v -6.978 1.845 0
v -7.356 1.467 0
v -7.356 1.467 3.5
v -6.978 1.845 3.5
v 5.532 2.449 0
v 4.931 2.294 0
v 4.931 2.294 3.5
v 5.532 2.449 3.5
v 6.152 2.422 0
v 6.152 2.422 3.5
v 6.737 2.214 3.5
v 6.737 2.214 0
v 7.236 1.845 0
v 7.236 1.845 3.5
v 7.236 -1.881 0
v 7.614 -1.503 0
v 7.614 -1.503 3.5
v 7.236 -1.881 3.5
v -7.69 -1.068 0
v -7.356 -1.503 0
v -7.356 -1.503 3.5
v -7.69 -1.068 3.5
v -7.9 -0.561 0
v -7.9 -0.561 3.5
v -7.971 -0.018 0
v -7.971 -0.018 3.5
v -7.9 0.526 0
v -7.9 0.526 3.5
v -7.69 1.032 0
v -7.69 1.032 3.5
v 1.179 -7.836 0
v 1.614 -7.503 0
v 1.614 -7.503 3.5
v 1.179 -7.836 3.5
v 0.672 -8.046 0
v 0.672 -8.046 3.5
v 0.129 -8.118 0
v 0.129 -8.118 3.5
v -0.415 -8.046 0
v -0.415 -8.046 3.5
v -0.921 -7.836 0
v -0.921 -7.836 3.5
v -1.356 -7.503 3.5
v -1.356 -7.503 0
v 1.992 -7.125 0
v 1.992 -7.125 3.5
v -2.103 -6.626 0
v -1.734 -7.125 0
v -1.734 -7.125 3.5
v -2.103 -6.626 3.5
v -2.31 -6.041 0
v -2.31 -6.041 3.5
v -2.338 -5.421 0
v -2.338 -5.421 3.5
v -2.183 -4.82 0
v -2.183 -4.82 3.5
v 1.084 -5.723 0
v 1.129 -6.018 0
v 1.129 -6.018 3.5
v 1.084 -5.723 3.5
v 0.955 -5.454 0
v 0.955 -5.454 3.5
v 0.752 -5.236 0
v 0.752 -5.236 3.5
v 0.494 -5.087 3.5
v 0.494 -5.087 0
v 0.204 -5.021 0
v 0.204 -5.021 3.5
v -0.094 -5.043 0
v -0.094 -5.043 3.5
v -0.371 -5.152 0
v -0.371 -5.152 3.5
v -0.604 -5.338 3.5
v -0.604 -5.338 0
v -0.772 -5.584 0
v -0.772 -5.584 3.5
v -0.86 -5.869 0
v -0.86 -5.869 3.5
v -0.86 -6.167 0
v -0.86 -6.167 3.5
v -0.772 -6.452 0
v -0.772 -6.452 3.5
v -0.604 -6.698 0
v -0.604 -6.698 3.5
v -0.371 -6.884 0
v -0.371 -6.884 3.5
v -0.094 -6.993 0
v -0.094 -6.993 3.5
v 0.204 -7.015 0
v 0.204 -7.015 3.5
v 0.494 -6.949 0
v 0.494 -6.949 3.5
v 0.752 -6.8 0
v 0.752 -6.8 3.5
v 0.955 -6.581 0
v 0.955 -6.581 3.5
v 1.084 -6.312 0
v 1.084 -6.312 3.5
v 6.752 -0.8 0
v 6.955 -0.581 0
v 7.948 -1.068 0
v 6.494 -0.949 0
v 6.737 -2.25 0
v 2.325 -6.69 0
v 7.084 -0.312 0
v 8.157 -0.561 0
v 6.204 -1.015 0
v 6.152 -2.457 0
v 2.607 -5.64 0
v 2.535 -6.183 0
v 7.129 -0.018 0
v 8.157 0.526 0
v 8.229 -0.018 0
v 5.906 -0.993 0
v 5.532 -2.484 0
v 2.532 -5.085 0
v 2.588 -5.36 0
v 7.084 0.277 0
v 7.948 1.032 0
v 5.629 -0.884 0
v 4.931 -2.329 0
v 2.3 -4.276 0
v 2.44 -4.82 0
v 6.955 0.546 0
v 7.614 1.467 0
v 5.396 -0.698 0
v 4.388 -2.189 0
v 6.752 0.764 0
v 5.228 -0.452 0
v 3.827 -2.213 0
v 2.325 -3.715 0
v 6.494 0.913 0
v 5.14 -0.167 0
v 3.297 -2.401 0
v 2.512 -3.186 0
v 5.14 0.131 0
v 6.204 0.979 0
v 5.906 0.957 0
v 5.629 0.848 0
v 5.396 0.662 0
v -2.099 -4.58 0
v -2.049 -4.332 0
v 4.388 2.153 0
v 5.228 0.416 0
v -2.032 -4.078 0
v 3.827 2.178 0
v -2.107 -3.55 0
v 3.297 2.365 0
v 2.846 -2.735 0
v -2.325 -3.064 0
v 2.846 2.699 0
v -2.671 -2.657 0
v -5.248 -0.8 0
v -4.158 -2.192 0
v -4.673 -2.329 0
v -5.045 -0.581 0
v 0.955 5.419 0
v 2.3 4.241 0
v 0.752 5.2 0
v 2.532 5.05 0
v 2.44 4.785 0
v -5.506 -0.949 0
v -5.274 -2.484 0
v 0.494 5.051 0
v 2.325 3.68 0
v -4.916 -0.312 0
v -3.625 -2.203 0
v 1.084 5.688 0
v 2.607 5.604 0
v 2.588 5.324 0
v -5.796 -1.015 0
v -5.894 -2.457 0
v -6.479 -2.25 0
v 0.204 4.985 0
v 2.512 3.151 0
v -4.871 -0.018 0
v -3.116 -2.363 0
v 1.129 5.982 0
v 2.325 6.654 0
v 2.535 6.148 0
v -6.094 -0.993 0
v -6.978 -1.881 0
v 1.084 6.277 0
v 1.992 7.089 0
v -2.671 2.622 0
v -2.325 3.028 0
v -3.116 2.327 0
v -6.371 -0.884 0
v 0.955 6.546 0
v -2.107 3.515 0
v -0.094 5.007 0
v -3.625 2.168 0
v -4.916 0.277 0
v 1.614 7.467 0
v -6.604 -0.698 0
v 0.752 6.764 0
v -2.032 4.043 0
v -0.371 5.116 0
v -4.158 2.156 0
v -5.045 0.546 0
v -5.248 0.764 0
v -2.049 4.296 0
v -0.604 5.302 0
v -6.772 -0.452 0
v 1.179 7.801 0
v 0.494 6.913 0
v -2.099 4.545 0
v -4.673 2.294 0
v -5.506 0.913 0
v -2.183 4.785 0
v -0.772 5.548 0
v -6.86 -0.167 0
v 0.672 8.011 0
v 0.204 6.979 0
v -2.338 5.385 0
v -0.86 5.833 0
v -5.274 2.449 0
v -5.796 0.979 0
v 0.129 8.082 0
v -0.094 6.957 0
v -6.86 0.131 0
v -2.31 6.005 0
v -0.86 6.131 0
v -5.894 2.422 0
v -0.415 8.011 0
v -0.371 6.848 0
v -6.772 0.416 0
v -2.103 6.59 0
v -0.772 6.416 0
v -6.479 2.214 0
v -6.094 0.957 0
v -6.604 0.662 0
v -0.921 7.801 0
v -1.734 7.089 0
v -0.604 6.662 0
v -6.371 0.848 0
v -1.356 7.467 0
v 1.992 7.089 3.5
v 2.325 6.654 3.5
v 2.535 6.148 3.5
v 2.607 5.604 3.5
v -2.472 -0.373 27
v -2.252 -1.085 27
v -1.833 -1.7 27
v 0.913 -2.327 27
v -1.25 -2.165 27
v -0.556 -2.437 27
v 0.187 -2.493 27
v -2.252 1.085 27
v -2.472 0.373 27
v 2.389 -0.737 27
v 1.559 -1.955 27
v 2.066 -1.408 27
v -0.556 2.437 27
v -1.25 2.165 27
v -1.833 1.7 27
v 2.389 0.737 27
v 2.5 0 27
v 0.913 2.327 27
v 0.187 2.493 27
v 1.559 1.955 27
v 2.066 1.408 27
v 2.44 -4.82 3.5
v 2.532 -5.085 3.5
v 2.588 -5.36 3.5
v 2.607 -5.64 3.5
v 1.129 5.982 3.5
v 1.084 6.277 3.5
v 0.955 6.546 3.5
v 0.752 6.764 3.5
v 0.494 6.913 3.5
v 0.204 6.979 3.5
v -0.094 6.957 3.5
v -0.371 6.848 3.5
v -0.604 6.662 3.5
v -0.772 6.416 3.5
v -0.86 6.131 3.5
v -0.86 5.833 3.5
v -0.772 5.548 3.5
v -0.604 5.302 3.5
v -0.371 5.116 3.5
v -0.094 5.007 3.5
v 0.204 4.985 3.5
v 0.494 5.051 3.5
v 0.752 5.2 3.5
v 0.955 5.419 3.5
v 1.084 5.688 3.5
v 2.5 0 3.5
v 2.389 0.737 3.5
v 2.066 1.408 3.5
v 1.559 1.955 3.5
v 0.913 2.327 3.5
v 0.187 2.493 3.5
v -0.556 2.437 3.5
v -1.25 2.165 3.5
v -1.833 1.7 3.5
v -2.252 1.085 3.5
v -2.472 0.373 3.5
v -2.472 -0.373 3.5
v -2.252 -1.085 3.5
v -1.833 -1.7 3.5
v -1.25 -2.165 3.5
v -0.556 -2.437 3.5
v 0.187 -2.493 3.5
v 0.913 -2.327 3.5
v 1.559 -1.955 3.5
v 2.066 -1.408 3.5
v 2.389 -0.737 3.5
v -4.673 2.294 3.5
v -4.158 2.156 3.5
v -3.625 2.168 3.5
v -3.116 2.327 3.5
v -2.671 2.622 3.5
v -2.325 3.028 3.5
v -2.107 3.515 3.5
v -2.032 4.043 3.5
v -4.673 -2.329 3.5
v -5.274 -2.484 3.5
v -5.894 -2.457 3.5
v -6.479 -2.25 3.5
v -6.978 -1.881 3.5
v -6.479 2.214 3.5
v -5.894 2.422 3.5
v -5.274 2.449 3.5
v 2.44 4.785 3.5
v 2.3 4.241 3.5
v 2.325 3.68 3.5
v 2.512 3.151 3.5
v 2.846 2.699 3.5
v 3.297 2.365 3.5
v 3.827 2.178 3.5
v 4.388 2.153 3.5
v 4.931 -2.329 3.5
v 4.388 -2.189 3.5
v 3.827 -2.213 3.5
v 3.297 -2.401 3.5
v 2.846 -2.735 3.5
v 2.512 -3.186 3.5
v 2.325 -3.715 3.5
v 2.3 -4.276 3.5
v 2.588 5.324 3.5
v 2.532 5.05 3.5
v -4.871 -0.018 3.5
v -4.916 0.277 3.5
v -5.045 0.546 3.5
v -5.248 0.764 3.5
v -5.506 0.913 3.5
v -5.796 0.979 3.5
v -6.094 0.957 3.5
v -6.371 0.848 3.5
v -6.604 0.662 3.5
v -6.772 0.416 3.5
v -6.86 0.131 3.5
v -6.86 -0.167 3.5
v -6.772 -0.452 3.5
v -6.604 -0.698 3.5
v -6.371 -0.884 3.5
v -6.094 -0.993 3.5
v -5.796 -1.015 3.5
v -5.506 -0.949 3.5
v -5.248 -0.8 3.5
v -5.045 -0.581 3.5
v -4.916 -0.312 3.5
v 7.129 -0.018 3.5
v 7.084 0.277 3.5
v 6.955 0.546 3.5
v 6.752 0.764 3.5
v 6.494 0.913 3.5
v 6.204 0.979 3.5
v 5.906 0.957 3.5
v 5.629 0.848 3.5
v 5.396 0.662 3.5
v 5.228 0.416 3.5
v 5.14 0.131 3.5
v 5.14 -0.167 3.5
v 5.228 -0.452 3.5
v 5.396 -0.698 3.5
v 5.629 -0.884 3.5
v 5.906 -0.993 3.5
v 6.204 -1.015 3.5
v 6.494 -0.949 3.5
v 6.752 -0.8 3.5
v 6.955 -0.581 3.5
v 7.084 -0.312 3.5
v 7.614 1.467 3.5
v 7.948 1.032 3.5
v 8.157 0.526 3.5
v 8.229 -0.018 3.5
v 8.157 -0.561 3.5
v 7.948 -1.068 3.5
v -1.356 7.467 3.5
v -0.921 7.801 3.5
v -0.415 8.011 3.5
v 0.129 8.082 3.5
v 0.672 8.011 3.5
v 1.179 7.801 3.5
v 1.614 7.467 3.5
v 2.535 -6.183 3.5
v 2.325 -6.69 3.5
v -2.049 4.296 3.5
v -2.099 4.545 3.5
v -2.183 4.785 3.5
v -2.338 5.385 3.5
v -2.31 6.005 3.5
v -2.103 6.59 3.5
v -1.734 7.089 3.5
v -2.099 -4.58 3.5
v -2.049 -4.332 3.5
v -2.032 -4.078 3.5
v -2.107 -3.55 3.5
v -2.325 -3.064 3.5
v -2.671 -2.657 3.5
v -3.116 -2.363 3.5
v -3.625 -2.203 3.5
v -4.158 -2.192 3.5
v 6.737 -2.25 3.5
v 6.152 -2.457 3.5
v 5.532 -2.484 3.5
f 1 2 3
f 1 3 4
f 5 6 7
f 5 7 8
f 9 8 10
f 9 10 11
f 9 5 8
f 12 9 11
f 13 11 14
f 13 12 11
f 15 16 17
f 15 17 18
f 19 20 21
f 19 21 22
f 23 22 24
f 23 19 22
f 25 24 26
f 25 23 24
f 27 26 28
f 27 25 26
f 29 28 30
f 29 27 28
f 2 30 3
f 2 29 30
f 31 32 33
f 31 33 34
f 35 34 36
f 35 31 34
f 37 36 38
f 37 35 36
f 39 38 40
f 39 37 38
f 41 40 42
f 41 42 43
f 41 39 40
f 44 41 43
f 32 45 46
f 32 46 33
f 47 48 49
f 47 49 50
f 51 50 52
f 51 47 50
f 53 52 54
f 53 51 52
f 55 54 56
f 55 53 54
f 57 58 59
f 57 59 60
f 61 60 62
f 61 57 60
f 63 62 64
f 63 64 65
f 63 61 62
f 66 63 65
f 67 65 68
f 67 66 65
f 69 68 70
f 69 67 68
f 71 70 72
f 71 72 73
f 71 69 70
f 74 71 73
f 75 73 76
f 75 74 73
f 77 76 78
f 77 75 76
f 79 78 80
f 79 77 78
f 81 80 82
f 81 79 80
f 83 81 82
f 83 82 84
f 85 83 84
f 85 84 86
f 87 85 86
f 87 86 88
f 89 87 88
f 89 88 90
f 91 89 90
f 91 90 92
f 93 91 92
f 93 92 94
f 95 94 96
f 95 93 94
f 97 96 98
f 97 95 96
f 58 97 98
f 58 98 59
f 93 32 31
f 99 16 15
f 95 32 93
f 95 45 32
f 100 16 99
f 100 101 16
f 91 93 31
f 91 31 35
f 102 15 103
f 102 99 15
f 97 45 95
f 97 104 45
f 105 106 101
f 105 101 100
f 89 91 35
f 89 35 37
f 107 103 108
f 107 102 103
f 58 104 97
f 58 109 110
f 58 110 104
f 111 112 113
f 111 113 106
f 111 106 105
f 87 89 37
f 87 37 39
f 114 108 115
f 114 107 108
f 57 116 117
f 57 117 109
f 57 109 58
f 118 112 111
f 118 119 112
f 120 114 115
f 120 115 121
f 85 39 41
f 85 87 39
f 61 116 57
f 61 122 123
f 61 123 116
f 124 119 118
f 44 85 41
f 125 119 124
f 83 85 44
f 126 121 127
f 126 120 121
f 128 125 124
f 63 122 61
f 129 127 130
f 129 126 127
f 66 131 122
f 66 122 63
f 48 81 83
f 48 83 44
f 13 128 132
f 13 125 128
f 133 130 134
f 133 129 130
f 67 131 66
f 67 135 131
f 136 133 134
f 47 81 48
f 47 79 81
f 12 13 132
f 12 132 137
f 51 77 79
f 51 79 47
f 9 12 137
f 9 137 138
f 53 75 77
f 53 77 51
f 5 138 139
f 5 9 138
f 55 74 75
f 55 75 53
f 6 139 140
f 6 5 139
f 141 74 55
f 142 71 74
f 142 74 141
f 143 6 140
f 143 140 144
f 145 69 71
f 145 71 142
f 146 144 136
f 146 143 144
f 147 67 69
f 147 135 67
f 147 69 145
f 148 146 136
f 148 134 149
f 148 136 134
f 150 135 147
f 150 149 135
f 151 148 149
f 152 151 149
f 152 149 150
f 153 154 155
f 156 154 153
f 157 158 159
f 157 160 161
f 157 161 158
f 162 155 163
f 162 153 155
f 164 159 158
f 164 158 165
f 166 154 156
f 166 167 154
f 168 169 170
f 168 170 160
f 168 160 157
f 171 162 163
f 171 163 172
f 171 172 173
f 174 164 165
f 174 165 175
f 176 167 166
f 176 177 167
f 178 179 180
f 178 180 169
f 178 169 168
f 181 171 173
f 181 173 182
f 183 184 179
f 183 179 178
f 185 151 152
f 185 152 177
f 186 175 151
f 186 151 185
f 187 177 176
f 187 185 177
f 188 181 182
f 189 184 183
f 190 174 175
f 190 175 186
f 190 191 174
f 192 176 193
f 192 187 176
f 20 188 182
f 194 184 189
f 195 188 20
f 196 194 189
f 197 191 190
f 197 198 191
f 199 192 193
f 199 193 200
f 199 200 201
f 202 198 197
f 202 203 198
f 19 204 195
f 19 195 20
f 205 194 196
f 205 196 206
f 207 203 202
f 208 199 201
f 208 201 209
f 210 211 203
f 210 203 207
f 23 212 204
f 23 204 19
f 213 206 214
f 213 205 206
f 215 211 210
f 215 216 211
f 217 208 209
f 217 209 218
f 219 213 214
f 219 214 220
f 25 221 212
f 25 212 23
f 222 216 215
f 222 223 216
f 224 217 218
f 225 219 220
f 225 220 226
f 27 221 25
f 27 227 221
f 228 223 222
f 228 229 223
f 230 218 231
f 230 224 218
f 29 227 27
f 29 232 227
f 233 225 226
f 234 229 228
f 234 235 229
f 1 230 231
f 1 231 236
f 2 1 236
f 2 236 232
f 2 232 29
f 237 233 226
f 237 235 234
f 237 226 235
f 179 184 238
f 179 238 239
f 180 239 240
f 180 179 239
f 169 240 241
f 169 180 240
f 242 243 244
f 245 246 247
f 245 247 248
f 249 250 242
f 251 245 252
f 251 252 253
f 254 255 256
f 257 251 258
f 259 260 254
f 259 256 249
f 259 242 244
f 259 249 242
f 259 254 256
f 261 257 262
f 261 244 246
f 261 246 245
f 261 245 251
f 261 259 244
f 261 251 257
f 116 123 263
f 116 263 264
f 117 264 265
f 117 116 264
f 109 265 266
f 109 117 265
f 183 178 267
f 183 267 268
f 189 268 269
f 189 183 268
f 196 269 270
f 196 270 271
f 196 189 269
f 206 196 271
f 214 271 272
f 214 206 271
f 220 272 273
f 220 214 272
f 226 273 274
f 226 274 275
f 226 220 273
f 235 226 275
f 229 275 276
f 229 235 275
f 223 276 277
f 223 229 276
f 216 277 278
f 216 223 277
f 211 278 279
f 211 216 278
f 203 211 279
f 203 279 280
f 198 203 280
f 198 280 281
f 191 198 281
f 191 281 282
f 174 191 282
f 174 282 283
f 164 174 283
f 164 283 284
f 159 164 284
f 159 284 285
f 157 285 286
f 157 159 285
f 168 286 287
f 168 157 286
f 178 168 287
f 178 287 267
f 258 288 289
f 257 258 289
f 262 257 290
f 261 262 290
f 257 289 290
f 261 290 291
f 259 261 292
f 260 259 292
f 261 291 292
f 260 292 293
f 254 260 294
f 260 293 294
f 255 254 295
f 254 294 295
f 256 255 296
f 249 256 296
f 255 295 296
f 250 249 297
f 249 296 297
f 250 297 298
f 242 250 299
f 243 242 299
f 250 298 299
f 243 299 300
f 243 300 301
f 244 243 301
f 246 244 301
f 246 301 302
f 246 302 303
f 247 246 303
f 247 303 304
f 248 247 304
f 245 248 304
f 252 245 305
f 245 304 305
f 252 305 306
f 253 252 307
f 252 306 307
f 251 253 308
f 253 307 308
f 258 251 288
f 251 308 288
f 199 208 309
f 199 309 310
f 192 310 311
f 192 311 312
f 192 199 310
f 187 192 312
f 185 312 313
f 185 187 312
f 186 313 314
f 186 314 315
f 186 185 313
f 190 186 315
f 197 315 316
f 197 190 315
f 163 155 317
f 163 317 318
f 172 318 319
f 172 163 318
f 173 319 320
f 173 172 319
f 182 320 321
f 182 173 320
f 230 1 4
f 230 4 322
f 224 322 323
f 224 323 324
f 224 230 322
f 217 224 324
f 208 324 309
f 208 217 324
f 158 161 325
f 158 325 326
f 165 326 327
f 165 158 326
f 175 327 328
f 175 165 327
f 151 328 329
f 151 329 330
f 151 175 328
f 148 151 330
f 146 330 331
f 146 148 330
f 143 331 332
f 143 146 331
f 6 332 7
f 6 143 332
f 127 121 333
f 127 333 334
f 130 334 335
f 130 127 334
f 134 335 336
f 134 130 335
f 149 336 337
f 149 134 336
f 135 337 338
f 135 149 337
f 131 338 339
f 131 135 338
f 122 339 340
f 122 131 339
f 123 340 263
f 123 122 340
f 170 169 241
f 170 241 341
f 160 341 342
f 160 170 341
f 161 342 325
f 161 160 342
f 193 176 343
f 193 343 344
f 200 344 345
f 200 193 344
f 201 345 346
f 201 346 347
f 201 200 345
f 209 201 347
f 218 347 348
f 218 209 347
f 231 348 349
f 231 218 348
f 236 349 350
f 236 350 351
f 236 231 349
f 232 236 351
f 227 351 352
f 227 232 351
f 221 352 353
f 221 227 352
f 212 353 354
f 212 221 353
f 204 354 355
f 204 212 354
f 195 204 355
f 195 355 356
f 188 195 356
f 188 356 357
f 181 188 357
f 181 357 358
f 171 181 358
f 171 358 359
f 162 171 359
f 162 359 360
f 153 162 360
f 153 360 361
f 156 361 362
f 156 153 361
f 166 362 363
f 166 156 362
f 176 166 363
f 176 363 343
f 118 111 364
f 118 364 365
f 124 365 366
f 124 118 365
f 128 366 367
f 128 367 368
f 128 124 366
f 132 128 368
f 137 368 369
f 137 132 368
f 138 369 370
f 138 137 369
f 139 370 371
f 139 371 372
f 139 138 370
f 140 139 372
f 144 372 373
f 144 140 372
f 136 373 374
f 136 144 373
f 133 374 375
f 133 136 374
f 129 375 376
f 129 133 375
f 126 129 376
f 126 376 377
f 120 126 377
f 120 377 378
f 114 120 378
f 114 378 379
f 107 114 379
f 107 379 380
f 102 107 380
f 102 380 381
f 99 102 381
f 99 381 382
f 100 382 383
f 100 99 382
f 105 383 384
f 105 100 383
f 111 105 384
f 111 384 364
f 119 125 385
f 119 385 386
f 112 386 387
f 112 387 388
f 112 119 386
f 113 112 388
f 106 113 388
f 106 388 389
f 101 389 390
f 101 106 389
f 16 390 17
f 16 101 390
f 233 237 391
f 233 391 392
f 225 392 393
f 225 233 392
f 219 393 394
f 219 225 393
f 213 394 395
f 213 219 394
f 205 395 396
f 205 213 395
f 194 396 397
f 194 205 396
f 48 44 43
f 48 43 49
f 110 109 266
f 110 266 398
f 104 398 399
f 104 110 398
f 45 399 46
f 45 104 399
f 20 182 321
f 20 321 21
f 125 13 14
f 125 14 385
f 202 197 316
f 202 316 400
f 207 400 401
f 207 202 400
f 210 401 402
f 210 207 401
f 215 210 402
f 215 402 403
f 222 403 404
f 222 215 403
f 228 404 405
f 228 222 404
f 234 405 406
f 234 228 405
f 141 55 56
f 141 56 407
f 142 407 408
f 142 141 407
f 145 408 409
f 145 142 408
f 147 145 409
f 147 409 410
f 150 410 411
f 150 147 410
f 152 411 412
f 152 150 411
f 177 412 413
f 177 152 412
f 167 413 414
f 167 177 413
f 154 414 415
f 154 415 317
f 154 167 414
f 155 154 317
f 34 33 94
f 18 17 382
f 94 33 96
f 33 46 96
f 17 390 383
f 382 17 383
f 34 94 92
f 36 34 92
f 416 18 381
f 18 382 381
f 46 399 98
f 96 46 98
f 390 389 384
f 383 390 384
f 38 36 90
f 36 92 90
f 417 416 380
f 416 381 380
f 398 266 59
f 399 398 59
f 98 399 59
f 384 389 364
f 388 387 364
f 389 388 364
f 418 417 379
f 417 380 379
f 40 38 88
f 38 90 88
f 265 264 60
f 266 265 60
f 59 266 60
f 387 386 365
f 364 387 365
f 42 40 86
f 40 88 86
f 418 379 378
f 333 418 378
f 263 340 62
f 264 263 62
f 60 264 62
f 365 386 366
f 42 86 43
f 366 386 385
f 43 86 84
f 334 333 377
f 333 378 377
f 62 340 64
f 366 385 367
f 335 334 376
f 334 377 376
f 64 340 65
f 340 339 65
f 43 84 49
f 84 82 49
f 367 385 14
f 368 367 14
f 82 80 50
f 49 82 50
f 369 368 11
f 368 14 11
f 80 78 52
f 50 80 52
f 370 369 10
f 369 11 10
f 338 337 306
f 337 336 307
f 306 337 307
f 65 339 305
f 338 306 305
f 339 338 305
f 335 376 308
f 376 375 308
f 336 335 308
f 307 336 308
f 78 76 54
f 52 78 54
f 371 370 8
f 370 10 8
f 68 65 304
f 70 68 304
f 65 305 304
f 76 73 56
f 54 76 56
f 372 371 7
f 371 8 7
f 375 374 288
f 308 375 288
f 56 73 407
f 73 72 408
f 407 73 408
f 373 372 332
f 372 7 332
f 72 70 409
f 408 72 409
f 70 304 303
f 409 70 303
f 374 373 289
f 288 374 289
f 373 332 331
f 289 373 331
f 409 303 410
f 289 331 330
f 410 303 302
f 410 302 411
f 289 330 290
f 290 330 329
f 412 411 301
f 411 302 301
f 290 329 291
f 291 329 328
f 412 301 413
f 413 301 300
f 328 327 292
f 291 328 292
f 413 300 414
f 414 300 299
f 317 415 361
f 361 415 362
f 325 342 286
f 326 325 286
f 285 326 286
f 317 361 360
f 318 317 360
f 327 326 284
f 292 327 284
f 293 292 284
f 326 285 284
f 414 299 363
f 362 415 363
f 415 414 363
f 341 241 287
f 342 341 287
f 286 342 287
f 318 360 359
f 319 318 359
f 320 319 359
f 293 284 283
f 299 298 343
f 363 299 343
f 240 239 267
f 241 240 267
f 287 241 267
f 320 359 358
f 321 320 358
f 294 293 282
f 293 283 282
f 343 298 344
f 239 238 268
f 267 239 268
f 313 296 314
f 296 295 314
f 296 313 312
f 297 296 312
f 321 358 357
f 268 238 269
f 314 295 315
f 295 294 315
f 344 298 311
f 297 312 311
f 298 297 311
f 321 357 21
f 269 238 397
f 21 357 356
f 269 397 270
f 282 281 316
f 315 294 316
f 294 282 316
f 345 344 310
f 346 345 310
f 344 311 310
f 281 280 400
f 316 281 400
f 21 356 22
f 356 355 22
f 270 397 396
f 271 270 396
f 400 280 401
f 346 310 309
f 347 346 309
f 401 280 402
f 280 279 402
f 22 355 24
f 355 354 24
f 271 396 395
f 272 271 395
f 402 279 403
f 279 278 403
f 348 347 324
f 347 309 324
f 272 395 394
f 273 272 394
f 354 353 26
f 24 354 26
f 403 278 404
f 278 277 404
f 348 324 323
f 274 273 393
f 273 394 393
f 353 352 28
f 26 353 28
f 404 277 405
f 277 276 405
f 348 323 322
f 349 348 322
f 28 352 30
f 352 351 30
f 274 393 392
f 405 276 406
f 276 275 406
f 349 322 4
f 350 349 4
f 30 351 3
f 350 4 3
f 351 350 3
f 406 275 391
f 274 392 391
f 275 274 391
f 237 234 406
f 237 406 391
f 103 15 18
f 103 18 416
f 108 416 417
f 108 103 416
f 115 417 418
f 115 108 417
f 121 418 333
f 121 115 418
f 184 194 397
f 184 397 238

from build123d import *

# Parameters (mm, degrees)
EXTRUDE_1_DEPTH = 3.5
SKETCH_3_R      = 2.5
EXTRUDE_2_DEPTH = 23.5


with BuildPart() as part:
    # 草图1 → 凸台-拉伸1 (new body)
    with BuildSketch(Plane.XY):
        with BuildLine():
            Line((-1.734039986, 7.089233915), (-1.356062107, 7.467211795))
            ThreePointArc((-1.356062107, 7.467211795), (0.128862134, 8.082287554), (1.613786374, 7.467211795))
            Line((1.613786374, 7.467211795), (1.991764254, 7.089233915))
            ThreePointArc((1.991764254, 7.089233915), (2.446987032, 6.407944883), (2.606840013, 5.604309675))
            ThreePointArc((2.606840013, 5.604309675), (2.564770676, 5.186073633), (2.440248217, 4.784594652))
            ThreePointArc((2.440248217, 4.784594652), (2.846019421, 2.699444842), (4.931169231, 2.293673637))
            ThreePointArc((4.931169231, 2.293673637), (6.152020505, 2.421597457), (7.235808495, 1.845189674))
            Line((7.235808495, 1.845189674), (7.613786374, 1.467211795))
            ThreePointArc((7.613786374, 1.467211795), (8.069009152, 0.785922762), (8.228862134, -0.017712446))
            ThreePointArc((8.228862134, -0.017712446), (8.069009152, -0.821347654), (7.613786374, -1.502636686))
            Line((7.613786374, -1.502636686), (7.235808495, -1.880614566))
            ThreePointArc((7.235808495, -1.880614566), (6.152020505, -2.457022348), (4.931169231, -2.329098529))
            ThreePointArc((4.931169231, -2.329098529), (2.846019421, -2.734869733), (2.440248217, -4.820019543))
            ThreePointArc((2.440248217, -4.820019543), (2.564770676, -5.221498525), (2.606840013, -5.639734566))
            ThreePointArc((2.606840013, -5.639734566), (2.446987032, -6.443369774), (1.991764254, -7.124658807))
            Line((1.991764254, -7.124658807), (1.613786374, -7.502636686))
            ThreePointArc((1.613786374, -7.502636686), (0.128862134, -8.117712446), (-1.356062107, -7.502636686))
            Line((-1.356062107, -7.502636686), (-1.734039986, -7.124658807))
            ThreePointArc((-1.734039986, -7.124658807), (-2.310447768, -6.040870817), (-2.182523949, -4.820019543))
            ThreePointArc((-2.182523949, -4.820019543), (-2.069860771, -4.456776655), (-2.031798038, -4.078372618))
            ThreePointArc((-2.031798038, -4.078372618), (-2.882781632, -2.494212089), (-4.673444964, -2.329098529))
            ThreePointArc((-4.673444964, -2.329098529), (-5.894296238, -2.457022348), (-6.978084227, -1.880614566))
            Line((-6.978084227, -1.880614566), (-7.356062107, -1.502636686))
            ThreePointArc((-7.356062107, -1.502636686), (-7.971137866, -0.017712446), (-7.356062107, 1.467211795))
            Line((-7.356062107, 1.467211795), (-6.978084227, 1.845189674))
            ThreePointArc((-6.978084227, 1.845189674), (-5.894296238, 2.421597457), (-4.673444964, 2.293673637))
            ThreePointArc((-4.673444964, 2.293673637), (-2.882781632, 2.458787198), (-2.031798038, 4.042947726))
            ThreePointArc((-2.031798038, 4.042947726), (-2.069860771, 4.421351764), (-2.182523949, 4.784594652))
            ThreePointArc((-2.182523949, 4.784594652), (-2.310447768, 6.005445926), (-1.734039986, 7.089233915))
        make_face()
        with BuildLine():
            ThreePointArc((-0.871137866, 5.982287554), (0.128862134, 4.982287554), (1.128862134, 5.982287554))
            ThreePointArc((1.128862134, 5.982287554), (0.128862134, 6.982287554), (-0.871137866, 5.982287554))
        make_face(mode=Mode.SUBTRACT)
        with BuildLine():
            ThreePointArc((-0.871137866, -6.017712446), (0.128862134, -7.017712446), (1.128862134, -6.017712446))
            ThreePointArc((1.128862134, -6.017712446), (0.128862134, -5.017712446), (-0.871137866, -6.017712446))
        make_face(mode=Mode.SUBTRACT)
        with BuildLine():
            ThreePointArc((5.128862134, -0.017712446), (6.128862134, -1.017712446), (7.128862134, -0.017712446))
            ThreePointArc((7.128862134, -0.017712446), (6.128862134, 0.982287554), (5.128862134, -0.017712446))
        make_face(mode=Mode.SUBTRACT)
        with BuildLine():
            ThreePointArc((-6.871137866, -0.017712446), (-5.871137866, -1.017712446), (-4.871137866, -0.017712446))
            ThreePointArc((-4.871137866, -0.017712446), (-5.871137866, 0.982287554), (-6.871137866, -0.017712446))
        make_face(mode=Mode.SUBTRACT)
    extrude(amount=EXTRUDE_1_DEPTH)

    # 草图3 → 凸台-拉伸2 (add)
    with BuildSketch(Plane.XY.offset(3.5)):
        Circle(SKETCH_3_R)
    extrude(amount=EXTRUDE_2_DEPTH)


solid = part.part
